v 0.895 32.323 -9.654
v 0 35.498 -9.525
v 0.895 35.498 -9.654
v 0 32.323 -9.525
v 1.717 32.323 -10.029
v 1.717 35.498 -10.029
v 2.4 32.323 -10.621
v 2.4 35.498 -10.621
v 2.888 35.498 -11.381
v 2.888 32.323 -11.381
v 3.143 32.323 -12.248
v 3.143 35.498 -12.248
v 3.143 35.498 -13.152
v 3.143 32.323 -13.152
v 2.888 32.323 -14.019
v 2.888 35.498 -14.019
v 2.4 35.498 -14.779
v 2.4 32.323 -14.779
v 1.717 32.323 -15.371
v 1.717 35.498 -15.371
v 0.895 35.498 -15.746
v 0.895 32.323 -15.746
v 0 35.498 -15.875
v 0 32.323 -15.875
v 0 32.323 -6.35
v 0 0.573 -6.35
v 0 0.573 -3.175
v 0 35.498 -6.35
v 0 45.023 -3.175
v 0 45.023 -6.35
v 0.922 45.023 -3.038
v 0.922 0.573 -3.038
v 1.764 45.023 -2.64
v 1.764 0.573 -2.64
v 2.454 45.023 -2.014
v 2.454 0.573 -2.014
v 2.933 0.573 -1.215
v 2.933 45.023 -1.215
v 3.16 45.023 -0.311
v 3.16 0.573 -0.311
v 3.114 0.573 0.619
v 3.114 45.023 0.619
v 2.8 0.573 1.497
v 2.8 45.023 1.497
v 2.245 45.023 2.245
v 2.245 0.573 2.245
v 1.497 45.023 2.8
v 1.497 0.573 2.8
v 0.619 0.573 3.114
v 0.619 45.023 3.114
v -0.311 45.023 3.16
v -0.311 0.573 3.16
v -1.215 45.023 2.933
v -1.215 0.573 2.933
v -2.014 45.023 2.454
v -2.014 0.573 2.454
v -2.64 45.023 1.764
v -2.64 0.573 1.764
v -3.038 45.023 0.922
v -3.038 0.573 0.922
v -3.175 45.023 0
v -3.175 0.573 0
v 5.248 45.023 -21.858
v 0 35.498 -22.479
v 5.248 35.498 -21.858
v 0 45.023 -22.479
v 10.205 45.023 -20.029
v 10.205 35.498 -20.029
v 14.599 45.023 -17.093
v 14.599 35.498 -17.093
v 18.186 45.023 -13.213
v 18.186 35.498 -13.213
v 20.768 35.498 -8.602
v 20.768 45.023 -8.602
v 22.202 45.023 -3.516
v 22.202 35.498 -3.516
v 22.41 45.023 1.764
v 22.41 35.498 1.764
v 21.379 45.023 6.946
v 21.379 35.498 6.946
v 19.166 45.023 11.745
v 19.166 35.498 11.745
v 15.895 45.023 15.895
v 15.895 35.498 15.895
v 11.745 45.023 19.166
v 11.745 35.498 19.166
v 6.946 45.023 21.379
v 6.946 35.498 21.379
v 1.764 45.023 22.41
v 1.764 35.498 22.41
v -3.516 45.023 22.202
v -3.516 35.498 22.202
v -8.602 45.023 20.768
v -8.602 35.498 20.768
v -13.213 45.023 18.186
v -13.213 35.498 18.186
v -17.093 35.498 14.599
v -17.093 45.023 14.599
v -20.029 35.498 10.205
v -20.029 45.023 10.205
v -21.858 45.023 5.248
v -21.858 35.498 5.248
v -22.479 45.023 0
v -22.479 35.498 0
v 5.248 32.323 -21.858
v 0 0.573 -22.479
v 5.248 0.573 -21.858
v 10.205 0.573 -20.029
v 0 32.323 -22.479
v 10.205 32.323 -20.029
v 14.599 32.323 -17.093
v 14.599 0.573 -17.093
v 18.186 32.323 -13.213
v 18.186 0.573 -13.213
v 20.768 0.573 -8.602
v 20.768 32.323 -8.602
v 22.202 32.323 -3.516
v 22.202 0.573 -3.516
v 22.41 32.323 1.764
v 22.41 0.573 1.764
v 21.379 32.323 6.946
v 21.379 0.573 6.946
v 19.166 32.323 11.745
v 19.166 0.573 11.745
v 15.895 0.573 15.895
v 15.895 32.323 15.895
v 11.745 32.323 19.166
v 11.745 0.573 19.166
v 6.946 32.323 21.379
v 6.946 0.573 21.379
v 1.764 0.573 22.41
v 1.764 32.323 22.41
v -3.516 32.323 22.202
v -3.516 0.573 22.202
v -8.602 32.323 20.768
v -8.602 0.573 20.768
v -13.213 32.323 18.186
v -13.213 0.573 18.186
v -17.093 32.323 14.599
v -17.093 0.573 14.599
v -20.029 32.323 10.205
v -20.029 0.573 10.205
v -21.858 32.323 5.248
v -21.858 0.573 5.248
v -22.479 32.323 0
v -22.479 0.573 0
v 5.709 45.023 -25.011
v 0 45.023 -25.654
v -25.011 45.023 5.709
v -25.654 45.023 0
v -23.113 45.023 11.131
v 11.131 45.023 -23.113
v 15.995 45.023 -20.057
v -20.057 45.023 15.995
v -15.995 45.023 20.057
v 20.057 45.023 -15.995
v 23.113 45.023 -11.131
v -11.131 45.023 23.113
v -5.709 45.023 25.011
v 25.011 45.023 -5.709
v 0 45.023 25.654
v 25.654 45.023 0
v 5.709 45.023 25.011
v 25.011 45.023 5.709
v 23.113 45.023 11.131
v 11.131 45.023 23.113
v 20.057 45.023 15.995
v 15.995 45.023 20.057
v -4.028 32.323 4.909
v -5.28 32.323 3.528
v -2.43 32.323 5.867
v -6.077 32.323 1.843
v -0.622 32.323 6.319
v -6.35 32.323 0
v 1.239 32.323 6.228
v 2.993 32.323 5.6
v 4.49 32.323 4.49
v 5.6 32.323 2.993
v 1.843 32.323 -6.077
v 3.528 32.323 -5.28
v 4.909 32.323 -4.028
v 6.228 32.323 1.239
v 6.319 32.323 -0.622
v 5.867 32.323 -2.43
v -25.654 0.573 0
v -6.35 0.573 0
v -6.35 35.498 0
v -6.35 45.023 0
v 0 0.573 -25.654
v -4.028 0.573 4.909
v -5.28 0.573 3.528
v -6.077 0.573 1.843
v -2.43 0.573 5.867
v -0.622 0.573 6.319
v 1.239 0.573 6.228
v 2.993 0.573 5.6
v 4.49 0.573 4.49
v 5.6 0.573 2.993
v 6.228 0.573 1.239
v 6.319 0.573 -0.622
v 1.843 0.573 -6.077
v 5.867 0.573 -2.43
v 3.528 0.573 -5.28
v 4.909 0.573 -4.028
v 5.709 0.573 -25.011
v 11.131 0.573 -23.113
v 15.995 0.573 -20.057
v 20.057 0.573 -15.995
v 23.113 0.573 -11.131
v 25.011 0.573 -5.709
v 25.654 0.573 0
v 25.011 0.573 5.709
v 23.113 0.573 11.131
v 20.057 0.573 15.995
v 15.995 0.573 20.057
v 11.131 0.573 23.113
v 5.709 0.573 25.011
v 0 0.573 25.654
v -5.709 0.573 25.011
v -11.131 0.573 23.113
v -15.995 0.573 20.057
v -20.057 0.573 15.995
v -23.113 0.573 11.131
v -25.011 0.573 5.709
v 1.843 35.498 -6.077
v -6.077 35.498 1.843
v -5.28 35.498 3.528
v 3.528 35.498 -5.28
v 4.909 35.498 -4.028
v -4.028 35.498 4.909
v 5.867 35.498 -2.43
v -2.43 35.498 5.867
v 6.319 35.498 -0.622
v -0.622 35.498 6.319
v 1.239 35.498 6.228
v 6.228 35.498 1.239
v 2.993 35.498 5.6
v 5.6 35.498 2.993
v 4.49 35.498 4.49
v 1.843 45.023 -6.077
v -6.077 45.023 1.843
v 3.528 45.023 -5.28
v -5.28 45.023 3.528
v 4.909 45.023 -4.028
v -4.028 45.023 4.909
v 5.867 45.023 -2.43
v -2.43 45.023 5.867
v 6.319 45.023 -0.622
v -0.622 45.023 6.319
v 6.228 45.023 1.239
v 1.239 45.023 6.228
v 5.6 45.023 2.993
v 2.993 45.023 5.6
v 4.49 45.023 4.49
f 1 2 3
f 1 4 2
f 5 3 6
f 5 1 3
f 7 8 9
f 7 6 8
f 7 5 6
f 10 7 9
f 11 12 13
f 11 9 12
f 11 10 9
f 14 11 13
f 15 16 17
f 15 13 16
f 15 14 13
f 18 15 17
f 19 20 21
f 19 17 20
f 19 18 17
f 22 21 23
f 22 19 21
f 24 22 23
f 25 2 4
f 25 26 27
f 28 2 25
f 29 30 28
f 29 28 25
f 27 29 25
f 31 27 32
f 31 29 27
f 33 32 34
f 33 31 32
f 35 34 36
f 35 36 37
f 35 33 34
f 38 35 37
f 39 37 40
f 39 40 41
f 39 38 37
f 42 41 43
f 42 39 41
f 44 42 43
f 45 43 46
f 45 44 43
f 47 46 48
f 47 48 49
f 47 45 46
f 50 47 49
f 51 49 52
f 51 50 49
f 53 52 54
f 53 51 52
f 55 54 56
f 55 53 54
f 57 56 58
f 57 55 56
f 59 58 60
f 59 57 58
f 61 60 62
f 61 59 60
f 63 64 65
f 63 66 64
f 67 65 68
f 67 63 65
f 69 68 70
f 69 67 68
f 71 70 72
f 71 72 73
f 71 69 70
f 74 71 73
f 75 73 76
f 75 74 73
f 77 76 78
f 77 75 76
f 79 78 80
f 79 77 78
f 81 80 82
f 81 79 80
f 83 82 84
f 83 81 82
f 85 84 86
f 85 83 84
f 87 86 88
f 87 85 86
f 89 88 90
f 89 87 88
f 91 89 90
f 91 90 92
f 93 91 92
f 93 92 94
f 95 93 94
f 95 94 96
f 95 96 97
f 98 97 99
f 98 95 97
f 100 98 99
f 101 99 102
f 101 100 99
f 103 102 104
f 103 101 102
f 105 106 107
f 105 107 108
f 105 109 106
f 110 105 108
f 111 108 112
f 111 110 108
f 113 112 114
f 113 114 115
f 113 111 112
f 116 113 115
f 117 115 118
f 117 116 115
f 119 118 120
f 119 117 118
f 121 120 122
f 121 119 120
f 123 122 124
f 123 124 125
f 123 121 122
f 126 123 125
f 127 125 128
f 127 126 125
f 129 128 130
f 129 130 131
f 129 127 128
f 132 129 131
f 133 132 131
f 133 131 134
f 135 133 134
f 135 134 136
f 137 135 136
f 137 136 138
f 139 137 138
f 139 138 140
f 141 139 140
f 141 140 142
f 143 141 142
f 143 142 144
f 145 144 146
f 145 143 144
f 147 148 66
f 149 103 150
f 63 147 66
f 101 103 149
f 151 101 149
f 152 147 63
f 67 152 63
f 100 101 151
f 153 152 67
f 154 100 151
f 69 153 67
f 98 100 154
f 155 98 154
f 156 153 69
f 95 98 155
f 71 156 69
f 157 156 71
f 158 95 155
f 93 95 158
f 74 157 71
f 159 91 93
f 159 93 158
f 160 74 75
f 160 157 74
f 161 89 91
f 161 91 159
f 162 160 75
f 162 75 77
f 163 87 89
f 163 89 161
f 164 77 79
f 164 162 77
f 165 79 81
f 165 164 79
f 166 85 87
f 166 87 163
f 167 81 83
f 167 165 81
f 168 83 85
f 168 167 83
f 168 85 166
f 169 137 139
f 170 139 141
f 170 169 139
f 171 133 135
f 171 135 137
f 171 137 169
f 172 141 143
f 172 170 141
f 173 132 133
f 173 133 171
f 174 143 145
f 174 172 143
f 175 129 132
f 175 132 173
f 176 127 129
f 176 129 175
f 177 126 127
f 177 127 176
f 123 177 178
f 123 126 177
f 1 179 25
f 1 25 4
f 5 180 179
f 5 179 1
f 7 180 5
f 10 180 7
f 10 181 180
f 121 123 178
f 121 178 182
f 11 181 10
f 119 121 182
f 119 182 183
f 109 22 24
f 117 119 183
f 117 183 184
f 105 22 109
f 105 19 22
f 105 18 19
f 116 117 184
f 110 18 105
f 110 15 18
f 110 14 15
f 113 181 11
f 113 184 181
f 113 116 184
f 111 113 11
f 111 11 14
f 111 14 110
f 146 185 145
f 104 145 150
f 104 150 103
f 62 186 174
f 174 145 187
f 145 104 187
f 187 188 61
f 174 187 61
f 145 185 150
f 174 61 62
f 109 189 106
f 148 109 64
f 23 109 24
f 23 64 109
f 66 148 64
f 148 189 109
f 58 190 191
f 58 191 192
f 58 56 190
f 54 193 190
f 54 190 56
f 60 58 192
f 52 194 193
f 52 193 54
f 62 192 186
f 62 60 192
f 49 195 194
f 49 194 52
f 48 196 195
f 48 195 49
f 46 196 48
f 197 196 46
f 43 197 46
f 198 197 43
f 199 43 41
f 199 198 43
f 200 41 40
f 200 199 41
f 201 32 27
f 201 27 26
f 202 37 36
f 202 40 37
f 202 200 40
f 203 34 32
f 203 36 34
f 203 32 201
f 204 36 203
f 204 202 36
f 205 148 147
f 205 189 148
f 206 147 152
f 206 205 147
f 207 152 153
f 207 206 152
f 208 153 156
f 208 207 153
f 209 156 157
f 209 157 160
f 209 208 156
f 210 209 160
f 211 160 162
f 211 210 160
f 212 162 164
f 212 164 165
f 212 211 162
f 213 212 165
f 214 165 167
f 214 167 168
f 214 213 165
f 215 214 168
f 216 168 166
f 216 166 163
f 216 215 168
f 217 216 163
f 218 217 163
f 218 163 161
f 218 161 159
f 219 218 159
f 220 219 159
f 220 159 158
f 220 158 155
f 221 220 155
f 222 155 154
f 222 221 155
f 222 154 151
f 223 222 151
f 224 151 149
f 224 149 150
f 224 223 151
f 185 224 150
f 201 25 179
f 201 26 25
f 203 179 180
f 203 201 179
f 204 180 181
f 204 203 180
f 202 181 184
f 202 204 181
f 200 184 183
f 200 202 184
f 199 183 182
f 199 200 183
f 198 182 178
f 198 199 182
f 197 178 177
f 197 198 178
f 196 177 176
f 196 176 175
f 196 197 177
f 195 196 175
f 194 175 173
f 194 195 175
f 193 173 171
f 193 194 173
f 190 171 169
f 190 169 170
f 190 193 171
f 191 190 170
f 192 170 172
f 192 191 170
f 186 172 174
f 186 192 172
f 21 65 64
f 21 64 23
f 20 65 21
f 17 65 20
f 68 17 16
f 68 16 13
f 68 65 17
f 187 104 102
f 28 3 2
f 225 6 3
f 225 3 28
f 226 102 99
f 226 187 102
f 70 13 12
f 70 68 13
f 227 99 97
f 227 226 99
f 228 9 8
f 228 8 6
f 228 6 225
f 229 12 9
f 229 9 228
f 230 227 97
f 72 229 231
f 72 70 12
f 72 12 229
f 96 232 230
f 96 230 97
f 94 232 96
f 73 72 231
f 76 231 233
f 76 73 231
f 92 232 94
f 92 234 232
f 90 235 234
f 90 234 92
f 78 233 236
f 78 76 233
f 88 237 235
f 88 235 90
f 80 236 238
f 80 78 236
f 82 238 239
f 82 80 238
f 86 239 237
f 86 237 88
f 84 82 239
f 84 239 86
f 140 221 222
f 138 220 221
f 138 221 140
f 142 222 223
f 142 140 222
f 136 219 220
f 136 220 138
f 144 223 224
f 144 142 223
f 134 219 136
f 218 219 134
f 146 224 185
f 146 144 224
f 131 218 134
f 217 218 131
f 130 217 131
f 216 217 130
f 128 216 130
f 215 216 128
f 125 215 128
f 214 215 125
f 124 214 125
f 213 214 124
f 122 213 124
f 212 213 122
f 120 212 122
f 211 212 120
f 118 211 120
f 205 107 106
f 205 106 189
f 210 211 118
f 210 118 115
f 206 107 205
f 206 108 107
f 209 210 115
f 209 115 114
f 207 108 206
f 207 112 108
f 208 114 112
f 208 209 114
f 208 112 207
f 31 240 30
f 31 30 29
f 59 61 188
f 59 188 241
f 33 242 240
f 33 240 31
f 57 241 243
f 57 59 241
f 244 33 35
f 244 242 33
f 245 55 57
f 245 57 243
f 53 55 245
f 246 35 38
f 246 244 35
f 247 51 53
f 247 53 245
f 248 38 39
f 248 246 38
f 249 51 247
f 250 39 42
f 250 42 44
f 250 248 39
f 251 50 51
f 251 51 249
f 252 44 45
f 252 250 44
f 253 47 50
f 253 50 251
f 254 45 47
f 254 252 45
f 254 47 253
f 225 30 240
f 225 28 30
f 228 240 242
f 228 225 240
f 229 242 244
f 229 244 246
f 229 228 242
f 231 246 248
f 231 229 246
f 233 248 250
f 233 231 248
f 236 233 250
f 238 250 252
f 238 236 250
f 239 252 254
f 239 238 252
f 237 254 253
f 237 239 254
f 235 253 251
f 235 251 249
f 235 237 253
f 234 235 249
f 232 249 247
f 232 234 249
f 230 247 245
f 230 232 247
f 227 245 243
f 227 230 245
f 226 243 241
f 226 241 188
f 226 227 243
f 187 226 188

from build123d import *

# Parameters (mm, degrees)
REVOLVE2_ANGLE     = 270
SKETCH5_R          = 3.175
CUT_EXTRUDE1_DEPTH = 46.023434974


with BuildPart() as part:
    # Sketch1 → Revolve2 (revolve)
    with BuildSketch(Plane(origin=(0, 0, 0), x_dir=(0, 0, -1), z_dir=(1, 0, 0))):
        Polygon((22.479, 35.498434974), (22.479, 45.023434974), (25.654, 45.023434974), (25.654, 0.573434974), (22.479, 0.573434974), (22.479, 32.323434974), (6.35, 32.323434974), (6.35, 0.573434974), (3.175, 0.573434974), (3.175, 45.023434974), (6.35, 45.023434974), (6.35, 35.498434974), align=None)
    revolve(axis=Axis((0, 45.023434974, 0), (0, -1, 0)), revolution_arc=REVOLVE2_ANGLE)

    # Sketch5 → Cut-Extrude1 (cut, through all)
    with BuildSketch(Plane(origin=(0, 0, 0), x_dir=(1, 0, 0), z_dir=(0, 1, 0))):
        with Locations((0, 12.7)):
            Circle(SKETCH5_R)
    extrude(amount=CUT_EXTRUDE1_DEPTH, mode=Mode.SUBTRACT)


solid = part.part
